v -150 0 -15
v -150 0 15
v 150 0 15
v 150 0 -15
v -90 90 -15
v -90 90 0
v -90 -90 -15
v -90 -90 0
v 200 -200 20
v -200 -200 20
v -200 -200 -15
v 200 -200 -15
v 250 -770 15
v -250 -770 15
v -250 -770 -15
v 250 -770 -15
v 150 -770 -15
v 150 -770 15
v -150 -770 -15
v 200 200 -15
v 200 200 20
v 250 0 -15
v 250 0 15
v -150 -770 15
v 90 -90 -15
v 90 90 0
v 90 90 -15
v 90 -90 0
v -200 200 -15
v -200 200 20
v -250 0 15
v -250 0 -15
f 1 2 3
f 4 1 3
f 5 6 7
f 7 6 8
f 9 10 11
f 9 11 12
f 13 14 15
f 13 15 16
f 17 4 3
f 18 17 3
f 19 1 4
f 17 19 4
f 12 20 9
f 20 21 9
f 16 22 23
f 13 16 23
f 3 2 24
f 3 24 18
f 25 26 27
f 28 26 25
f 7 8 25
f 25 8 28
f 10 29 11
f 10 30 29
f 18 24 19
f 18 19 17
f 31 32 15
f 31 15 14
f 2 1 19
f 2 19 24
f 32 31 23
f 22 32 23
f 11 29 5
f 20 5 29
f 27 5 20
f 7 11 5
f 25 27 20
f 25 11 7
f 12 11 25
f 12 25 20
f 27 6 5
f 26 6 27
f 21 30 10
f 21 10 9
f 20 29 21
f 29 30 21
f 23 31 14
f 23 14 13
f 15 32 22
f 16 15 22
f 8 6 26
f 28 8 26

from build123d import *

# Parameters (mm, degrees)
F0_W     = 500
F0_H     = 30
F1_DEPTH = 770
F2_W     = 400
F2_H     = 400
F3_DEPTH = 20
F4_W     = 400
F4_H     = 400
F4_W_2   = 180
F4_H_2   = 180
F5_DEPTH = 15
F6_W     = 300
F6_H     = 30
F7_DEPTH = 770


with BuildPart() as f1:
    # F0 (on Front) → F1 (new body)
    with BuildSketch(Plane.XZ):
        Rectangle(F0_W, F0_H)
    extrude(amount=F1_DEPTH)


with BuildPart() as f3:
    # F2 (on Top) → F3 (new body)
    with BuildSketch(Plane.XY):
        Rectangle(F2_W, F2_H)
    extrude(amount=F3_DEPTH)

    # F4 (on face) → F5 (join)
    with BuildSketch(Plane(origin=(0, 0, 0), x_dir=(1, 0, 0), z_dir=(0, 0, -1))):
        Rectangle(F4_W, F4_H)
        Rectangle(F4_W_2, F4_H_2, mode=Mode.SUBTRACT)
    extrude(amount=F5_DEPTH)


with BuildPart() as f7:
    # F6 (on Front) → F7 (new body)
    with BuildSketch(Plane.XZ):
        Rectangle(F6_W, F6_H)
    extrude(amount=F7_DEPTH)


solid = Compound([f1.part, f3.part, f7.part])
